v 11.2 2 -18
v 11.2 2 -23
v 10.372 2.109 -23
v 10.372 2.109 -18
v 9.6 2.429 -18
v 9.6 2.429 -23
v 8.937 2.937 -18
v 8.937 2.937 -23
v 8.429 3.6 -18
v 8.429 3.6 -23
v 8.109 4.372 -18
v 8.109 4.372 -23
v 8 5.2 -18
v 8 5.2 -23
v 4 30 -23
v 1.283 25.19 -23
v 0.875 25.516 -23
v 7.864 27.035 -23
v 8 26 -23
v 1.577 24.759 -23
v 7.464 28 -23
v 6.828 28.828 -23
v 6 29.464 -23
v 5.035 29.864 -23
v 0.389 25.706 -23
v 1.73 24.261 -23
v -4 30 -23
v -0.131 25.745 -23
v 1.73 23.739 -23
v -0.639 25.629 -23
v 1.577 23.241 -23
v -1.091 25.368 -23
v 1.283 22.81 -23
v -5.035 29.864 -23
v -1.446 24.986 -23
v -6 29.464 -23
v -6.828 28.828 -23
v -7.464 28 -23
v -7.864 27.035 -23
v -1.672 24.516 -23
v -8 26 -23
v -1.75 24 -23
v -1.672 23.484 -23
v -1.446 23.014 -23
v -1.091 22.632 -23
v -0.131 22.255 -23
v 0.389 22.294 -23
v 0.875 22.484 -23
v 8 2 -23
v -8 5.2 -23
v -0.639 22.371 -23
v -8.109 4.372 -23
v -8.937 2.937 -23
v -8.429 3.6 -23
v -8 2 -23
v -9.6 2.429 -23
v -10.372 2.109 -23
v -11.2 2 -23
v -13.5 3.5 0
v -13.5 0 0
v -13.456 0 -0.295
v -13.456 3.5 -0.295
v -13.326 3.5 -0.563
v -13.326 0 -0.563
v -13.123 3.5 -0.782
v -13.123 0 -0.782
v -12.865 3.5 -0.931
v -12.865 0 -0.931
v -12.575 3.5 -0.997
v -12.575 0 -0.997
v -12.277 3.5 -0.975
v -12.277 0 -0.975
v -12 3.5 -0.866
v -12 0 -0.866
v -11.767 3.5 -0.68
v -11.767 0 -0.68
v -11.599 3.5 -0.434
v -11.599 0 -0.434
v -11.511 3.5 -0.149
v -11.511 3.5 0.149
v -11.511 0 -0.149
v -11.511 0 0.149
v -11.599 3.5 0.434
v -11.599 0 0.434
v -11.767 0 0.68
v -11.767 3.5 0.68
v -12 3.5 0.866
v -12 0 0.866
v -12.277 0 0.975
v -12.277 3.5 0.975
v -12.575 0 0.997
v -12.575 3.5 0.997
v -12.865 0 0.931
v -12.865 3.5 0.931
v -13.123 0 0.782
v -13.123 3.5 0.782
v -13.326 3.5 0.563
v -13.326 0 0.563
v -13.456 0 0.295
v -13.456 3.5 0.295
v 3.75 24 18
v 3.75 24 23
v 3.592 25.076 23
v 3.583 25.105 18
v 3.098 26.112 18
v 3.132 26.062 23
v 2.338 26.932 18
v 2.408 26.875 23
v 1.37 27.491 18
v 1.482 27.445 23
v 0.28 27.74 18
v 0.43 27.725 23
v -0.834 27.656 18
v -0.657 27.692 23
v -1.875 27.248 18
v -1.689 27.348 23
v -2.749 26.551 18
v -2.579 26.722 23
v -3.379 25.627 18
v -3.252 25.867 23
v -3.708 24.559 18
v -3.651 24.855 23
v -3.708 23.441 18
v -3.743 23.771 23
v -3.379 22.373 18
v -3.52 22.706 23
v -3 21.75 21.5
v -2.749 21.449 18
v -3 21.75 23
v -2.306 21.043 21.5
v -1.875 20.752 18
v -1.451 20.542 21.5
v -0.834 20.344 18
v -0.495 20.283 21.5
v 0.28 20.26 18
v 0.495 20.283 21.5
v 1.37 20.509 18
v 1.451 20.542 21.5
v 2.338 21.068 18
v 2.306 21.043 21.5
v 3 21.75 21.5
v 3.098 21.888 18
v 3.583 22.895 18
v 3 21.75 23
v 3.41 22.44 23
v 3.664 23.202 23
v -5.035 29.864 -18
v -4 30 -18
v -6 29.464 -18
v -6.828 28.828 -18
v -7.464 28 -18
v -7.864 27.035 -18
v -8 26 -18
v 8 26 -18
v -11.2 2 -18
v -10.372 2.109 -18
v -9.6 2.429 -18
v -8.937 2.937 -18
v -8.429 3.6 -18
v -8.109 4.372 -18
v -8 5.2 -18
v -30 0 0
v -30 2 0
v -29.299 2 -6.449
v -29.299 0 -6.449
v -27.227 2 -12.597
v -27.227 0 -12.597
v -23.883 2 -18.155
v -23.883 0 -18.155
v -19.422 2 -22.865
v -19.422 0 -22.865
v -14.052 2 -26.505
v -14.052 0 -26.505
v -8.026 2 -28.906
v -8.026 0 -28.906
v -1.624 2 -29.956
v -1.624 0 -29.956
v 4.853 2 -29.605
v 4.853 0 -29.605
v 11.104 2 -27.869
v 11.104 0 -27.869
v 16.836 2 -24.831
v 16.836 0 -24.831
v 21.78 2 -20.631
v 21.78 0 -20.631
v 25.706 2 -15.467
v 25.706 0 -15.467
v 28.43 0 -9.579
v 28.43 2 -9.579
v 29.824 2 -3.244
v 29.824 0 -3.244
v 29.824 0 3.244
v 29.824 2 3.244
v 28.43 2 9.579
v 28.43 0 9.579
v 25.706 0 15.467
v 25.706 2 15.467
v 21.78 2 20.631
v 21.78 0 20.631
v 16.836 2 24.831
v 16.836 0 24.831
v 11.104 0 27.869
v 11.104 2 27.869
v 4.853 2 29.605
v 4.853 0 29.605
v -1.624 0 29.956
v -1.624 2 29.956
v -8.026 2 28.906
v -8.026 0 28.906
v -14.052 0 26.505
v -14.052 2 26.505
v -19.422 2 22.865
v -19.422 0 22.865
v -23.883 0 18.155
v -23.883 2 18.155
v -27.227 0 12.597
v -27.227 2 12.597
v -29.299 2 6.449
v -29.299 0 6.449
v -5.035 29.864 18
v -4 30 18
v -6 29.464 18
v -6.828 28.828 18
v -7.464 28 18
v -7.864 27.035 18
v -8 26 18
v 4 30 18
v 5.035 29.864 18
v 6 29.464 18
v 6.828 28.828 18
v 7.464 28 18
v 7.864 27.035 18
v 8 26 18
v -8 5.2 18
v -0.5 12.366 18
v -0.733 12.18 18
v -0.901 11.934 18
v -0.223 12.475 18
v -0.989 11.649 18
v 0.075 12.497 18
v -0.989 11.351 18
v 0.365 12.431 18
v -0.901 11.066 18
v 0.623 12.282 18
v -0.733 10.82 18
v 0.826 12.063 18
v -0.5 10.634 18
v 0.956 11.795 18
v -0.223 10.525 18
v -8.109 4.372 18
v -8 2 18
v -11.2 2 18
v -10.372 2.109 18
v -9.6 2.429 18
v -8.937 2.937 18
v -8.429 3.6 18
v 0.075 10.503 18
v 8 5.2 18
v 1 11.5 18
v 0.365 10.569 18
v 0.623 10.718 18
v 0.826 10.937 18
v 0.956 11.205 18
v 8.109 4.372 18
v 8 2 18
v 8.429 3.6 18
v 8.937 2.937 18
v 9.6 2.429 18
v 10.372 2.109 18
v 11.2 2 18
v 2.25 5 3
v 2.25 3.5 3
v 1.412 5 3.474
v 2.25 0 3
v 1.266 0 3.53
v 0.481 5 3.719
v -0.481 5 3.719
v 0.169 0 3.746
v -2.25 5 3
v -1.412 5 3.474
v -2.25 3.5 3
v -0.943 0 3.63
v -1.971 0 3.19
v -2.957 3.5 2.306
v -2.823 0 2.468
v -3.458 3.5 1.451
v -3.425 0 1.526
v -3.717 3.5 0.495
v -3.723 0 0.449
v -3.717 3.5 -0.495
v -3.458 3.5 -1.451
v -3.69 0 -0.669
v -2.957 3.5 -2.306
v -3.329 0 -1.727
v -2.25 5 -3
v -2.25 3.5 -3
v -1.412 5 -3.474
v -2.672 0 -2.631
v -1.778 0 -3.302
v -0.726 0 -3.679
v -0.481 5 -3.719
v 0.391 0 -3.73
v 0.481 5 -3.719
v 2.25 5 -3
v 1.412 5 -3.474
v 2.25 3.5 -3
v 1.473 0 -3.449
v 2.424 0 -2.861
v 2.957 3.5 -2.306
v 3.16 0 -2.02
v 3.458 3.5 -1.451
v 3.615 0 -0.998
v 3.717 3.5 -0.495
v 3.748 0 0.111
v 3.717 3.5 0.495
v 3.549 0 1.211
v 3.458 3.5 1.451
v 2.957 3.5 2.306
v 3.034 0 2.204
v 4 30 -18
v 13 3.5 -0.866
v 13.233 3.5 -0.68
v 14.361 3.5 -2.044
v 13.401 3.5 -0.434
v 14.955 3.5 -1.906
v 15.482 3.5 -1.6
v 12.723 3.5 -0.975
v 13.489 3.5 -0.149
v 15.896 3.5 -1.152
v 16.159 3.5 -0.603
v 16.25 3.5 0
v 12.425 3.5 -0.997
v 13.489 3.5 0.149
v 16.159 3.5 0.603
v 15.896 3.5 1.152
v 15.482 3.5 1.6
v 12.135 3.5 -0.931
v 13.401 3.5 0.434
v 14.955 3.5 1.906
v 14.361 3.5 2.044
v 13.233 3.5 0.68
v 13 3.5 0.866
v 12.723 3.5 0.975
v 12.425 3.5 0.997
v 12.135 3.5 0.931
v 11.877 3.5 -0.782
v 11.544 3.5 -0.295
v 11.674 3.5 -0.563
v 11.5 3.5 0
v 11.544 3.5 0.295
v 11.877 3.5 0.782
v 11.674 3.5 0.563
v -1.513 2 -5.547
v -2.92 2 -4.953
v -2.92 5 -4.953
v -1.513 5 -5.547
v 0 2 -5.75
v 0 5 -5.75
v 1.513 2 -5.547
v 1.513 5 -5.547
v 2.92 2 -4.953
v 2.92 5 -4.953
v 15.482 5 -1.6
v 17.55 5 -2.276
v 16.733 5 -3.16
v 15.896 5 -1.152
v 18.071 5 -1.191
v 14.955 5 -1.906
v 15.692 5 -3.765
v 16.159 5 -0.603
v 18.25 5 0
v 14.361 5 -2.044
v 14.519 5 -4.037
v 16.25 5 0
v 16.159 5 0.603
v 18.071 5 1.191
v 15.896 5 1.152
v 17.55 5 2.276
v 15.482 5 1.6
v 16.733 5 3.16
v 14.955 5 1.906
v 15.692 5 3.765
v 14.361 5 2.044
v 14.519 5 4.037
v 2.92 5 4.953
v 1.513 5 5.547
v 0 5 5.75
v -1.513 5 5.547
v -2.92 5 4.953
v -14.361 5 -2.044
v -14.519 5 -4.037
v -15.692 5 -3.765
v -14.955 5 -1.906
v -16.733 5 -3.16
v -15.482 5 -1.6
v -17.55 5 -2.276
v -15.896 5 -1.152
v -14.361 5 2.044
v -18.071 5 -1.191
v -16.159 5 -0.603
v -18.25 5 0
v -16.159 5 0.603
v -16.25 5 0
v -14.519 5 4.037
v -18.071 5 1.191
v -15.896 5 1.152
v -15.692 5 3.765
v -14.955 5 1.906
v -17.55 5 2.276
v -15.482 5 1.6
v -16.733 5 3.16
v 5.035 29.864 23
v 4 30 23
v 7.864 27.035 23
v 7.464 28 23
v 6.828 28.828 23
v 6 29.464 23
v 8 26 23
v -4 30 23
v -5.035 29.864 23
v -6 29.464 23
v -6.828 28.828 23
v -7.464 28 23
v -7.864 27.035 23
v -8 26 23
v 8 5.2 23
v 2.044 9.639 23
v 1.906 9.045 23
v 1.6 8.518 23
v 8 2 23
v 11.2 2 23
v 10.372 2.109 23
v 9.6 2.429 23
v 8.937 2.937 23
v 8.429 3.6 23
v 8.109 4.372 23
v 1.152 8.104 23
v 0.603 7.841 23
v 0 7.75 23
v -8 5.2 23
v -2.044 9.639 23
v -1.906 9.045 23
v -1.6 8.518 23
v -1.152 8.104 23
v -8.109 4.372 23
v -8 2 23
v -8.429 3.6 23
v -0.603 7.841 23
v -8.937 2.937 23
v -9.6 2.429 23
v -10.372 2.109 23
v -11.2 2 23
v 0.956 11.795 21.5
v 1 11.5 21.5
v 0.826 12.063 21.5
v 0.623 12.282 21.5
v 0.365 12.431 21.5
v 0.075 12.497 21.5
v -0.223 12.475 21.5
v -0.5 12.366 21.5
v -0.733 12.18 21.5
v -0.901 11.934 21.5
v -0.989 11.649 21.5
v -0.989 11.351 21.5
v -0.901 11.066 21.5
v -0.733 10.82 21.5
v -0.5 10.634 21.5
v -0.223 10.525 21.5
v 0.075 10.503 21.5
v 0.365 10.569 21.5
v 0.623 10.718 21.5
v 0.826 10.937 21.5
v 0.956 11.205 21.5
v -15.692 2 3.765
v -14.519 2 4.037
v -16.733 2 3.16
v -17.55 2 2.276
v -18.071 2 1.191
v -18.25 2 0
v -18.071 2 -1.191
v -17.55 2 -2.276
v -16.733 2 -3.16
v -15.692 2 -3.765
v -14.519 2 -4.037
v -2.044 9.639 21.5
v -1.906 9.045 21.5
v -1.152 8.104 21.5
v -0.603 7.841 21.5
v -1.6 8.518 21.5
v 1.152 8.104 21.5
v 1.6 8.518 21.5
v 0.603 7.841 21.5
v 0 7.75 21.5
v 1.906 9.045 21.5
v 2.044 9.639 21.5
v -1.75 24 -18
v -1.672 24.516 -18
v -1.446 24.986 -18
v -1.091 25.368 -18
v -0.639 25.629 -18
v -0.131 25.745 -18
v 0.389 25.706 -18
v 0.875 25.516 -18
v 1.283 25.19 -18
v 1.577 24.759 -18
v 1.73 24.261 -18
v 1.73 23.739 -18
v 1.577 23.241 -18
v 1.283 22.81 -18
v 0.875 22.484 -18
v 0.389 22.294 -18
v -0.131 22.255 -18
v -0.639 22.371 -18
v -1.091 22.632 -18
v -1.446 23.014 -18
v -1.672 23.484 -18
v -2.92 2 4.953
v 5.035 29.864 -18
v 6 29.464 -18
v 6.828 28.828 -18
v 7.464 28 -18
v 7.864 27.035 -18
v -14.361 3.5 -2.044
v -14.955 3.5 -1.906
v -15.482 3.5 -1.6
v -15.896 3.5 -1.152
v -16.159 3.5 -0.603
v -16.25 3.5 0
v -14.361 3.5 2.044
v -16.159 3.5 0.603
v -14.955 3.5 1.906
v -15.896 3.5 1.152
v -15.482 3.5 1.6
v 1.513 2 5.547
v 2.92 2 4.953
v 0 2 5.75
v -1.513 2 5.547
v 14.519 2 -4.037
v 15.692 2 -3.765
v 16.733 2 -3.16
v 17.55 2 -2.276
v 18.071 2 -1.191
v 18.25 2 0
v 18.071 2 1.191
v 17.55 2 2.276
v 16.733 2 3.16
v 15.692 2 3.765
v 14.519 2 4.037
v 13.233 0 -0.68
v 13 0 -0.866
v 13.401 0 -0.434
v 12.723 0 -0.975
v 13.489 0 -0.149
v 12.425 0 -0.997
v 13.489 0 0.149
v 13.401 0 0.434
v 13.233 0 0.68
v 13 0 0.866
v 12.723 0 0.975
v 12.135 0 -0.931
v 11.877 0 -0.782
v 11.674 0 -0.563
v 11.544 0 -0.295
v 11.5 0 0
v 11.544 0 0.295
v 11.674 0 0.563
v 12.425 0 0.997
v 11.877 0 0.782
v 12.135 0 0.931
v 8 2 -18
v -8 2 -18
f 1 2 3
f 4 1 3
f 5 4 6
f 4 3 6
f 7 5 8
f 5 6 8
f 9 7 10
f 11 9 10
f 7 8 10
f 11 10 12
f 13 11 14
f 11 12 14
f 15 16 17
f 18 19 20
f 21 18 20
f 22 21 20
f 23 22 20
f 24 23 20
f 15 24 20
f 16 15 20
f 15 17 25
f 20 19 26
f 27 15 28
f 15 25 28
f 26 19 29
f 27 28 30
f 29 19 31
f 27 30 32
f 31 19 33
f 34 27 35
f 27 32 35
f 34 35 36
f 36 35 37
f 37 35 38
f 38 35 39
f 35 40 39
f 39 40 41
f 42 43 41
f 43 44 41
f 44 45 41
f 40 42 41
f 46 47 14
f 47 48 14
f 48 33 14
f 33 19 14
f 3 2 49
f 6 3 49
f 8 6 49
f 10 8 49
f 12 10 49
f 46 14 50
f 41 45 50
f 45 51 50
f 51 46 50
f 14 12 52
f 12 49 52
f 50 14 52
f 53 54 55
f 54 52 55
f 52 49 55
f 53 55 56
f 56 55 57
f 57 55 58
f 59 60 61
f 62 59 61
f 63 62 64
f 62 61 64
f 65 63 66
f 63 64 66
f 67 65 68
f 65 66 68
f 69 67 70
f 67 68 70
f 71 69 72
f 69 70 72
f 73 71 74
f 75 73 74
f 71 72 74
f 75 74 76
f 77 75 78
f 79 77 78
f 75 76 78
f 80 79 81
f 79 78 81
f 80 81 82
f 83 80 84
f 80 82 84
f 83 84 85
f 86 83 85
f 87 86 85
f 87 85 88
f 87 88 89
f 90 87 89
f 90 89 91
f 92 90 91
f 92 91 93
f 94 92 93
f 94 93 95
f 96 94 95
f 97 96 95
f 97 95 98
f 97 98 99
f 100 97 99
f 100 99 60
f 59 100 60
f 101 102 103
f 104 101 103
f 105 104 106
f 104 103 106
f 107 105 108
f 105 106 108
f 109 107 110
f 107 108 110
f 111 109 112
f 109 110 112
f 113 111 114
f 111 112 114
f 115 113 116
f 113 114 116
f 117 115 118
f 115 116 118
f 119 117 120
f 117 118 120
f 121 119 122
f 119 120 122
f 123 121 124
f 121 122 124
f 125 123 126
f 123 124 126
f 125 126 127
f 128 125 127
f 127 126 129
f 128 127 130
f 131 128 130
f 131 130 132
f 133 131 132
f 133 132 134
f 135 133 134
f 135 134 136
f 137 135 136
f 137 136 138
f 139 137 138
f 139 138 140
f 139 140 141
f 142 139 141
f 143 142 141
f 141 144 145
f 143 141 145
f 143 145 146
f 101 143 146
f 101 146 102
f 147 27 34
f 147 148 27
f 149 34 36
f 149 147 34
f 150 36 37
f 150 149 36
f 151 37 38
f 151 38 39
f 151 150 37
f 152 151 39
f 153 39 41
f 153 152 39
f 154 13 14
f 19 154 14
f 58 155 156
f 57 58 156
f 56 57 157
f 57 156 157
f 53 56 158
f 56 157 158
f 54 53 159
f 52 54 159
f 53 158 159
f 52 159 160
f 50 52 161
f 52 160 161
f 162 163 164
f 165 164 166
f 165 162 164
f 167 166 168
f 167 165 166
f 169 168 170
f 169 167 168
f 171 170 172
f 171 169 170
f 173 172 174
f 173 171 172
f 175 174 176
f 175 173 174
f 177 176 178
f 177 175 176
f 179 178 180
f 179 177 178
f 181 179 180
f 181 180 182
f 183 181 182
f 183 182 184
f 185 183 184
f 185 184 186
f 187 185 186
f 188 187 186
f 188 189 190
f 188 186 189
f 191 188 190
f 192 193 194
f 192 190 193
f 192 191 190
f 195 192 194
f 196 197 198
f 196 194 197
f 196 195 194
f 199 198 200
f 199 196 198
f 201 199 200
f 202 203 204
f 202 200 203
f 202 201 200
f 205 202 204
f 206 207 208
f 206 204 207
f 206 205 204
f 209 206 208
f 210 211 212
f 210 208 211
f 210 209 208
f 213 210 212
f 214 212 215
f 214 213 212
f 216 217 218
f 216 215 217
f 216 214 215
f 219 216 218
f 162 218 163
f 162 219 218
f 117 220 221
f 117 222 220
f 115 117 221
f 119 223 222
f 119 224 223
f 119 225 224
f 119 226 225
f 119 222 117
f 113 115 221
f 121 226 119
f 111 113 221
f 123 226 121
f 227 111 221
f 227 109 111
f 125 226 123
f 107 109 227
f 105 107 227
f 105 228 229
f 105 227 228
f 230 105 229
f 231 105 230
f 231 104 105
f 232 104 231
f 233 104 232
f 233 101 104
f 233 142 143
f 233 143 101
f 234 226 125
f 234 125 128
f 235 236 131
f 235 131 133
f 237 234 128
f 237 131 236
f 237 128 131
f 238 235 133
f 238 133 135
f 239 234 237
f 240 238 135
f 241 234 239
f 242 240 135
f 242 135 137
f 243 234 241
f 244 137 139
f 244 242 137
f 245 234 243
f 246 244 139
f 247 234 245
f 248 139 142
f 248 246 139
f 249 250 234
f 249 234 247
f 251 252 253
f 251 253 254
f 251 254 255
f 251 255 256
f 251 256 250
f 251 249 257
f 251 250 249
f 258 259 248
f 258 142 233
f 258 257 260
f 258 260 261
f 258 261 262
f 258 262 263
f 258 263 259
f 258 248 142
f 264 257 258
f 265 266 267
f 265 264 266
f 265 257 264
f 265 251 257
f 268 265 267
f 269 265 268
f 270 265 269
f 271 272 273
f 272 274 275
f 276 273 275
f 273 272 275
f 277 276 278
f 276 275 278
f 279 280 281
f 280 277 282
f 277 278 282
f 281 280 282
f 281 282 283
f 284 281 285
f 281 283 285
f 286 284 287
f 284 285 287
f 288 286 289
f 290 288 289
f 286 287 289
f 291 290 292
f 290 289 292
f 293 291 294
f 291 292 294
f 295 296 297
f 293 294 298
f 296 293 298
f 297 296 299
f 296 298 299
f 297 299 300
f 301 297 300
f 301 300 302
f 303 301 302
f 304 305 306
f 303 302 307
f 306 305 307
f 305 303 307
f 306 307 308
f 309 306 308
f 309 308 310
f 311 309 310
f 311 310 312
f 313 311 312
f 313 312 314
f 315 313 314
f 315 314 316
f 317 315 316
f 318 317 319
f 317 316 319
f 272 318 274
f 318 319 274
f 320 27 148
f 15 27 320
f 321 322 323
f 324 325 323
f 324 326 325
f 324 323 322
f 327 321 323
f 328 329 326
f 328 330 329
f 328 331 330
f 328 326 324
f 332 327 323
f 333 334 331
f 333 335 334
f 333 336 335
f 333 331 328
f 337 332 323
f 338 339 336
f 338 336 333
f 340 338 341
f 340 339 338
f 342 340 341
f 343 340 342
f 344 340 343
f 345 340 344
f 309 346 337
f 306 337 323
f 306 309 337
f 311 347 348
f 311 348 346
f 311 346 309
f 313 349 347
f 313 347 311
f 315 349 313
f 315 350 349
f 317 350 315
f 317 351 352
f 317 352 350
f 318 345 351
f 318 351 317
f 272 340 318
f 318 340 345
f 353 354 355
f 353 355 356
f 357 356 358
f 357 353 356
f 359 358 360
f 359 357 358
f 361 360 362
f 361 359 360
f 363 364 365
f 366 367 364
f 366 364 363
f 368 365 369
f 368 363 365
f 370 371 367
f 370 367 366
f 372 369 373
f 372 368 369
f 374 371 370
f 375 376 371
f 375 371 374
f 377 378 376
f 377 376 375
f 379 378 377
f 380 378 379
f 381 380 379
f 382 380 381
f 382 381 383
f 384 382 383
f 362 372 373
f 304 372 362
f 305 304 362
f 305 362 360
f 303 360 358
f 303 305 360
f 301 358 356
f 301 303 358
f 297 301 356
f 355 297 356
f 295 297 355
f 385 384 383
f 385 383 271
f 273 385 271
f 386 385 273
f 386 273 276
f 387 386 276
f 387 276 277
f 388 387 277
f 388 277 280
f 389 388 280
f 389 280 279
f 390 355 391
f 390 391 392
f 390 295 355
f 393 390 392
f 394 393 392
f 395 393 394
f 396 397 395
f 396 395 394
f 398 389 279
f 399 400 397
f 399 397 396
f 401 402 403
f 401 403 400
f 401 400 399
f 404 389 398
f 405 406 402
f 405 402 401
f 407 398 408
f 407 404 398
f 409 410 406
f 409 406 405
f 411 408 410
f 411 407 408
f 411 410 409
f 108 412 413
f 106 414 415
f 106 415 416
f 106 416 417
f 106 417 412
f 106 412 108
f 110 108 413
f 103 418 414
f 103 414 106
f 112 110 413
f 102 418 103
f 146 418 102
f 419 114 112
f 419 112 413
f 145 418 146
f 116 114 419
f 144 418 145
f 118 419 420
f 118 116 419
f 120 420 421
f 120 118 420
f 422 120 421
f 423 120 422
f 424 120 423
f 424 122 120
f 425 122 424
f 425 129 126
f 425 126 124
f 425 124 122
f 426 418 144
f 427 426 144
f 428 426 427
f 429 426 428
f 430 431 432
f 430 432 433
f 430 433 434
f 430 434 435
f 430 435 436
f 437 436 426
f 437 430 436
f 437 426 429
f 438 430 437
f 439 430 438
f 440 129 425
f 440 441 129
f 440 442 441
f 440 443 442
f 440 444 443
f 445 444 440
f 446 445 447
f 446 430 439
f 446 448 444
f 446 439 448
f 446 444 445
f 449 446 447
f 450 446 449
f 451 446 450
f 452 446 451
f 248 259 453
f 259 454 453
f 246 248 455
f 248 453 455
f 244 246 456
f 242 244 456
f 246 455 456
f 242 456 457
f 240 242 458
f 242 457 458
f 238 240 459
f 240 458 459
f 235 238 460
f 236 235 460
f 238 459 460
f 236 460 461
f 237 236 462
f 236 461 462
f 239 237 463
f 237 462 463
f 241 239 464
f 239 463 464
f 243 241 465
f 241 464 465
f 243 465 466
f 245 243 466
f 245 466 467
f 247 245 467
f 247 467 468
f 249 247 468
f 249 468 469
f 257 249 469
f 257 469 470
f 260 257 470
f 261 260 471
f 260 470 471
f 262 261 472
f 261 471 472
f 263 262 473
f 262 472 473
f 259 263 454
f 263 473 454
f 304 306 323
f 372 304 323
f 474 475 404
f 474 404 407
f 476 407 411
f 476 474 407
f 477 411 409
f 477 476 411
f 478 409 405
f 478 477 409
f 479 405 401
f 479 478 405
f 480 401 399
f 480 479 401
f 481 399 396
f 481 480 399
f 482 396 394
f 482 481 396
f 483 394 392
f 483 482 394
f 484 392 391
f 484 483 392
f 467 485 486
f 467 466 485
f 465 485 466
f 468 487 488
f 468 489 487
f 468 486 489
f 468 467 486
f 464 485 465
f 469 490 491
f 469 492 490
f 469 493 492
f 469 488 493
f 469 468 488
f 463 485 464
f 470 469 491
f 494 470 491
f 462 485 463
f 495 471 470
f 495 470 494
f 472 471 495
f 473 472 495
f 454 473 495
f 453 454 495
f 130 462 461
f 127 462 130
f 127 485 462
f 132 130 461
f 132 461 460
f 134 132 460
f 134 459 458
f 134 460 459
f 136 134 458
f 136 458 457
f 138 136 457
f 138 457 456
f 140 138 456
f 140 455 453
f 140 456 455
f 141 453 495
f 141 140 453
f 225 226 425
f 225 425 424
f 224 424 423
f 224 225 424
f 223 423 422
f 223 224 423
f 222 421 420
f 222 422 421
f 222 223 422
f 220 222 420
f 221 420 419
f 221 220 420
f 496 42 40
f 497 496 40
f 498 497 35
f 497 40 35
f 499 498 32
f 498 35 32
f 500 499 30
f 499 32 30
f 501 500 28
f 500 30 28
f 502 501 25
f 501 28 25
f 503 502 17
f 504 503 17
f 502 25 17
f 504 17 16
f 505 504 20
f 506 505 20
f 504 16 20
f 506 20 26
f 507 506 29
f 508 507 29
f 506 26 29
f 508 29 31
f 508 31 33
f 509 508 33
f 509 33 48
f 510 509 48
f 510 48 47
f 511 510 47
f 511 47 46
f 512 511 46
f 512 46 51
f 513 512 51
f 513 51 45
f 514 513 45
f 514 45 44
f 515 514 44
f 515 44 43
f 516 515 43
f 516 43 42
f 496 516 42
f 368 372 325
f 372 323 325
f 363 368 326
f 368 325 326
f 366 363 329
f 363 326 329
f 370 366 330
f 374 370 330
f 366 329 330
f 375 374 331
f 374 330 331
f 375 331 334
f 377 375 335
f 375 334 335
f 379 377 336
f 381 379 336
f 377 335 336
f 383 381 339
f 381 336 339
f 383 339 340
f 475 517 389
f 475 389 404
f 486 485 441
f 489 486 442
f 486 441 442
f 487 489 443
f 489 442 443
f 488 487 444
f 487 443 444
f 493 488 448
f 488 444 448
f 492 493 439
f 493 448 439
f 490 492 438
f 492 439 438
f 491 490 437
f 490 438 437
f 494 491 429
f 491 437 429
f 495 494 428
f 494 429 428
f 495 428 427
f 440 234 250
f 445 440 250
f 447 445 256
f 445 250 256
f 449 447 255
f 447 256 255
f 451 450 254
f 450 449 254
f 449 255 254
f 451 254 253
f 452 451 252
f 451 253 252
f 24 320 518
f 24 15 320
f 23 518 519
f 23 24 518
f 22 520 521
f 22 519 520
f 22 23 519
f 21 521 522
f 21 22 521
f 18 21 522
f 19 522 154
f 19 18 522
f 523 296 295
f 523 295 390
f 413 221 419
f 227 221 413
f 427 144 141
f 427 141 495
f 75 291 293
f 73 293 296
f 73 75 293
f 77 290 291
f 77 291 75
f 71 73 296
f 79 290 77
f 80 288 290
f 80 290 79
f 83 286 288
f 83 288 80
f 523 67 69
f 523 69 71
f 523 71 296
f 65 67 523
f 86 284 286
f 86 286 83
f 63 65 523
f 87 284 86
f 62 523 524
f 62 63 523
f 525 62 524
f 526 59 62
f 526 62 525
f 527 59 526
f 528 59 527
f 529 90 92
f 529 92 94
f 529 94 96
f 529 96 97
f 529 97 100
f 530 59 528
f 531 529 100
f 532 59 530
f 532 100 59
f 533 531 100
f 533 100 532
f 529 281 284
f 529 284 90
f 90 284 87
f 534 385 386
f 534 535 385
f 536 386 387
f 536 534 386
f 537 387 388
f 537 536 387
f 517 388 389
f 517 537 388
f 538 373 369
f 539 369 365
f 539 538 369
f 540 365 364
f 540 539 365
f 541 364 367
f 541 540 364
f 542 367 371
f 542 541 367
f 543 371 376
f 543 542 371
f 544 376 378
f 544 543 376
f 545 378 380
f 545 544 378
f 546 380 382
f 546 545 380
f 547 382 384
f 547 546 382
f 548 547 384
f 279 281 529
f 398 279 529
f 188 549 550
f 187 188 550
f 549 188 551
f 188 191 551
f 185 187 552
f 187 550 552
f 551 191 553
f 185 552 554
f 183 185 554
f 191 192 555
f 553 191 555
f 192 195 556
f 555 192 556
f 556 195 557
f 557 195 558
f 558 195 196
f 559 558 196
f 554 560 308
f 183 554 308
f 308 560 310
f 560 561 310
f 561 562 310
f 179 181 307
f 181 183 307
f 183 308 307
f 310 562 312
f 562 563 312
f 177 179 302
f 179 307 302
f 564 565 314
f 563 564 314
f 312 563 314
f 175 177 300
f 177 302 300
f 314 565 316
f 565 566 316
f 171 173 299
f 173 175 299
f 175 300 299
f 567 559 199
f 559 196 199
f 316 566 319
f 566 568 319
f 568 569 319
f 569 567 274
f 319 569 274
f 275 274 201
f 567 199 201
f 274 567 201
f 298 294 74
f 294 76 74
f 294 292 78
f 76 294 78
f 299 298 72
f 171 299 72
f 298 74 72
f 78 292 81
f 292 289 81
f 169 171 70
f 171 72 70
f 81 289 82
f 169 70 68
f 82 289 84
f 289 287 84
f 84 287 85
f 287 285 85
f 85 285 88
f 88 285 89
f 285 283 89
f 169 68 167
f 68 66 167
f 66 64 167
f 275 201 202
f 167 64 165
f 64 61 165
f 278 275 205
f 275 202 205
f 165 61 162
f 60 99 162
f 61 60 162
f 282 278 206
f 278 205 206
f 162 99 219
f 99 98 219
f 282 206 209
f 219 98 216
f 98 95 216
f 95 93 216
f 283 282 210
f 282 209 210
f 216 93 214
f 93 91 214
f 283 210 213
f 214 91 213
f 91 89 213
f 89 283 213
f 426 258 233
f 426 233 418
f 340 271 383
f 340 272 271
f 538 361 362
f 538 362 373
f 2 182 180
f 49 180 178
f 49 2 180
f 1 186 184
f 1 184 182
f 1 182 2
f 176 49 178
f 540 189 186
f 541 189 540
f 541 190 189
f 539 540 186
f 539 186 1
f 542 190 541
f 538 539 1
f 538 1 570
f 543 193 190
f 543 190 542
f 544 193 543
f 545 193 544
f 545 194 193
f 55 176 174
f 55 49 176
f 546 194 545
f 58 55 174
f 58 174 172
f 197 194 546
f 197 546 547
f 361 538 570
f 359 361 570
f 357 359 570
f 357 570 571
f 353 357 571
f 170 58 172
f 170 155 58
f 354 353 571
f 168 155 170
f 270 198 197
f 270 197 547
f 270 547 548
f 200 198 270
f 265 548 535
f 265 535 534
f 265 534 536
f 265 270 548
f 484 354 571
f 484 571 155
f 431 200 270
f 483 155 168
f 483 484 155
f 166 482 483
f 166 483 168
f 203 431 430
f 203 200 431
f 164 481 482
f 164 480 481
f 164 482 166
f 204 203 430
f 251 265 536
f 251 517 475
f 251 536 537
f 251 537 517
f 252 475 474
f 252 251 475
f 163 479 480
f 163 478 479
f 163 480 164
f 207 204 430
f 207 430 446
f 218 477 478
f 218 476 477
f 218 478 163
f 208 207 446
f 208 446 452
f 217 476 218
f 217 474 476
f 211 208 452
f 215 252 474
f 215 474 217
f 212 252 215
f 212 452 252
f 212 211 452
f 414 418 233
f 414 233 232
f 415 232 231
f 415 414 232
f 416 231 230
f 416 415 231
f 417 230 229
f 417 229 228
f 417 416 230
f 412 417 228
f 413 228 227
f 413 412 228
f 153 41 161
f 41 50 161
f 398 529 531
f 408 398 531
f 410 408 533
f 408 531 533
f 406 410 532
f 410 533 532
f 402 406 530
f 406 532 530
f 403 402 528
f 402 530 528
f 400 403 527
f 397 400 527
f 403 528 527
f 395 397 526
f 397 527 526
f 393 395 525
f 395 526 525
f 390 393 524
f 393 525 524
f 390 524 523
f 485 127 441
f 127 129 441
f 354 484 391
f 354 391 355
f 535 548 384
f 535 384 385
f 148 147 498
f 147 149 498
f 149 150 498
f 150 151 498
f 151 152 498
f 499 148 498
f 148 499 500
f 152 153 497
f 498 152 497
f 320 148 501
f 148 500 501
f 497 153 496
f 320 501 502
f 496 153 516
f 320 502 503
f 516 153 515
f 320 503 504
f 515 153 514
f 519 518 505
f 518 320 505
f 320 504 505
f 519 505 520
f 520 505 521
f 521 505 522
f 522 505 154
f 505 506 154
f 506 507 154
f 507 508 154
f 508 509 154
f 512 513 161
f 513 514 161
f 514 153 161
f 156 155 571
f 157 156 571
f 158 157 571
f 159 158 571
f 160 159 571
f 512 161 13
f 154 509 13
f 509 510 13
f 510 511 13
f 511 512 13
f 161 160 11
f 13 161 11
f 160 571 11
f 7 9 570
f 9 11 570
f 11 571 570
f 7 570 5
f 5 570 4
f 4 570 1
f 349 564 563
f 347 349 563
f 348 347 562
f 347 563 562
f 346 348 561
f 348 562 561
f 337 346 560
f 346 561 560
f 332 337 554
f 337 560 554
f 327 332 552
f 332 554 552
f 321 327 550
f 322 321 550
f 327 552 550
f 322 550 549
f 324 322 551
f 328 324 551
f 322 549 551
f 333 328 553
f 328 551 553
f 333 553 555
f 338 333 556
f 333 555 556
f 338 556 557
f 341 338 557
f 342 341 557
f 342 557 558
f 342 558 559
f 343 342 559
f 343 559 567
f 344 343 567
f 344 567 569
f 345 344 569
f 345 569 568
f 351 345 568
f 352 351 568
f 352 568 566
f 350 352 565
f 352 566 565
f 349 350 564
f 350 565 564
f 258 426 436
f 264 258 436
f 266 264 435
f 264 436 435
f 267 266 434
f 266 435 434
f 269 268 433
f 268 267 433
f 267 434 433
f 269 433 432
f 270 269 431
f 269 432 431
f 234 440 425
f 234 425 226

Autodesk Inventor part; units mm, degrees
ref_plane "YZ Plane" through (0, 0, 0) normal (1, 0, 0) x (0, 1, 0)
ref_plane "XZ Plane" through (0, 0, 0) normal (0, 1, 0) x (-1, 0, 0)
ref_plane "XY Plane" through (0, 0, 0) normal (0, 0, 1) x (1, 0, 0)
sketch "スケッチ1" plane through (0, 0, 0) normal (0, 1, 0) x (-1, 0, 0)
  circle A0 centre (0, 0) radius 30
  line L0 (0, -50.5872) -> (0, 52.7432)
  line L1 (-2.25, -3) -> (-14.3614, -2.0436)
  line L2 (47.5195, 0) -> (-63.2606, 0)
  line L3 (-2.25, 3) -> (-14.3614, 2.0436)
  arc A1 (-14.3614, 2.0436) -> (-14.3614, -2.0436) centre (-14.2, 0) ccw
  line L4 (2.25, -3) -> (14.3614, -2.0436)
  line L5 (2.25, 3) -> (14.3614, 2.0436)
  arc A2 (14.3614, -2.0436) -> (14.3614, 2.0436) centre (14.2, 0) ccw
  arc A3 (-2.25, -3) -> (2.25, -3) centre (0, 0) ccw
  arc A4 (2.25, 3) -> (-2.25, 3) centre (0, 0) ccw
  circle A5 centre (-12.5, 0) radius 1
  circle A6 centre (12.5, 0) radius 1
  line L6 (14.5188, -4.0374) -> (2.9201, -4.9533)
  arc A7 (-2.9201, -4.9533) -> (2.9201, -4.9533) centre (0, 0) ccw
  line L7 (-2.9201, -4.9533) -> (-14.5188, -4.0374)
  arc A8 (-14.5188, 4.0374) -> (-14.5188, -4.0374) centre (-14.2, 0) ccw
  line L8 (-14.5188, 4.0374) -> (-2.9201, 4.9533)
  arc A9 (2.9201, 4.9533) -> (-2.9201, 4.9533) centre (0, 0) ccw
  line L9 (2.9201, 4.9533) -> (14.5188, 4.0374)
  arc A10 (14.5188, -4.0374) -> (14.5188, 4.0374) centre (14.2, 0) ccw
  arc A11 (2.25, -3) -> (2.25, 3) centre (0, 0) ccw
  arc A12 (-2.25, 3) -> (-2.25, -3) centre (0, 0) ccw
  dimension "d0" = 60
  dimension "d1" = 14.2
  dimension "d2" = 2.05
  dimension "d3" = 6
  dimension "d5" = 12.5
  dimension "d6" = 2
  dimension "d7" = 2
  dimension "d10" = 3.75
extrude "押し出し1" add sketch "スケッチ1" along normal blind 2 contours L2 A10 L9 A9 L0 A0 | A0 L0 A7 L6 A10 L2 | L0 A9 L8 A8 L2 A0 | A0 L2 A8 L7 A7 L0
extrude "押し出し2" add sketch "スケッチ1" along normal blind 5 contours A10 L6 A7 L0 A3 L4 A2 L2 | L2 A2 L5 A4 L0 A9 L9 A10 | L0 A4 L3 A1 L2 A8 L8 A9 | A7 L7 A8 L2 A1 L1 A3 L0
extrude "押し出し3" add sketch "スケッチ1" along normal blind 3.5 contours A2 L4 A11 L2 A6 | L2 A6 A11 L5 A2 | A1 L3 A12 L2 A5 | L2 A5 A12 L1 A1
sketch "スケッチ2" plane through (0, 2, 0) normal (0, 1, 0) x (1, 0, 0)
  line L0 (0, 57.7571) -> (0, -77.3728)
  line L1 (-74.0829, 0) -> (96.0409, 0)
  line L2 (-8, 18) -> (8, 18)
  line L3 (8, 18) -> (8, 23)
  line L4 (8, 23) -> (-8, 23)
  line L5 (-8, 23) -> (-8, 18)
  line L6 (-8, -18) -> (8, -18)
  line L7 (8, -18) -> (8, -23)
  line L8 (8, -23) -> (-8, -23)
  line L9 (-8, -23) -> (-8, -18)
  point P0 (0, 0)
  dimension "d15" = 36
  dimension "d16" = 16
  dimension "d17" = 5
extrude "押し出し4" add sketch "スケッチ2" along normal blind 28
sketch "スケッチ4" plane through (-8, 2, 23) normal (0, 0, 1) x (1, 0, 0)
  line L0 (0, 28) -> (16, 28) projected
  line L1 (8, 28) -> (8, 0)
  line L2 (38, 0) -> (-22, 0) projected
  circle A0 centre (8, 22) radius 3.75
  arc A1 (5.9564, 7.6386) -> (10.0436, 7.6386) centre (8, 7.8) ccw
  line L3 (5, 19.75) -> (5.9564, 7.6386)
  line L4 (11, 19.75) -> (10.0436, 7.6386)
  circle A2 centre (8, 9.5) radius 1
  point P0 (8, -2)
  dimension "d20" = 14.2
  dimension "d21" = 2
  dimension "d22" = 6
  dimension "d23" = 7.5
  dimension "d24" = 22
  dimension "d25" = 2.05
  dimension "d26" = 12.5
extrude "押し出し5" cut sketch "スケッチ4" against normal up to surface (5 mm away) contours A0 L1 | L1 A0 | A2 L1 | L1 A2
extrude "押し出し6" cut sketch "スケッチ4" against normal blind 1.5 contours A0 L4 A1 L1 A2 | L1 A2 A1 L3 A0
sketch "スケッチ5" plane through (8, 2, -23) normal (0, 0, -1) x (-1, 0, 0)
  line L0 (16, 28) -> (0, 28) projected
  line L1 (8, 28) -> (8, 0)
  line L2 (38, 0) -> (-22, 0) projected
  circle A0 centre (8, 22) radius 1.75
  circle A1 centre (8, 22) radius 3.75 projected
  point P0 (8, -2)
  dimension "d31" = 3.5
extrude "押し出し7" cut sketch "スケッチ5" against normal up to surface (5 mm away) contours A0 L1 | L1 A0
fillet "フィレット1" radius 3.2 4 edges at (8, 2, -20.5) (8, 2, 20.5) (-8, 2, -20.5) (-8, 2, 20.5)
fillet "フィレット2" radius 4 4 edges at (-8, 30, -20.5) (8, 30, -20.5) (-8, 30, 20.5) (8, 30, 20.5)
properties part number "axis1"
